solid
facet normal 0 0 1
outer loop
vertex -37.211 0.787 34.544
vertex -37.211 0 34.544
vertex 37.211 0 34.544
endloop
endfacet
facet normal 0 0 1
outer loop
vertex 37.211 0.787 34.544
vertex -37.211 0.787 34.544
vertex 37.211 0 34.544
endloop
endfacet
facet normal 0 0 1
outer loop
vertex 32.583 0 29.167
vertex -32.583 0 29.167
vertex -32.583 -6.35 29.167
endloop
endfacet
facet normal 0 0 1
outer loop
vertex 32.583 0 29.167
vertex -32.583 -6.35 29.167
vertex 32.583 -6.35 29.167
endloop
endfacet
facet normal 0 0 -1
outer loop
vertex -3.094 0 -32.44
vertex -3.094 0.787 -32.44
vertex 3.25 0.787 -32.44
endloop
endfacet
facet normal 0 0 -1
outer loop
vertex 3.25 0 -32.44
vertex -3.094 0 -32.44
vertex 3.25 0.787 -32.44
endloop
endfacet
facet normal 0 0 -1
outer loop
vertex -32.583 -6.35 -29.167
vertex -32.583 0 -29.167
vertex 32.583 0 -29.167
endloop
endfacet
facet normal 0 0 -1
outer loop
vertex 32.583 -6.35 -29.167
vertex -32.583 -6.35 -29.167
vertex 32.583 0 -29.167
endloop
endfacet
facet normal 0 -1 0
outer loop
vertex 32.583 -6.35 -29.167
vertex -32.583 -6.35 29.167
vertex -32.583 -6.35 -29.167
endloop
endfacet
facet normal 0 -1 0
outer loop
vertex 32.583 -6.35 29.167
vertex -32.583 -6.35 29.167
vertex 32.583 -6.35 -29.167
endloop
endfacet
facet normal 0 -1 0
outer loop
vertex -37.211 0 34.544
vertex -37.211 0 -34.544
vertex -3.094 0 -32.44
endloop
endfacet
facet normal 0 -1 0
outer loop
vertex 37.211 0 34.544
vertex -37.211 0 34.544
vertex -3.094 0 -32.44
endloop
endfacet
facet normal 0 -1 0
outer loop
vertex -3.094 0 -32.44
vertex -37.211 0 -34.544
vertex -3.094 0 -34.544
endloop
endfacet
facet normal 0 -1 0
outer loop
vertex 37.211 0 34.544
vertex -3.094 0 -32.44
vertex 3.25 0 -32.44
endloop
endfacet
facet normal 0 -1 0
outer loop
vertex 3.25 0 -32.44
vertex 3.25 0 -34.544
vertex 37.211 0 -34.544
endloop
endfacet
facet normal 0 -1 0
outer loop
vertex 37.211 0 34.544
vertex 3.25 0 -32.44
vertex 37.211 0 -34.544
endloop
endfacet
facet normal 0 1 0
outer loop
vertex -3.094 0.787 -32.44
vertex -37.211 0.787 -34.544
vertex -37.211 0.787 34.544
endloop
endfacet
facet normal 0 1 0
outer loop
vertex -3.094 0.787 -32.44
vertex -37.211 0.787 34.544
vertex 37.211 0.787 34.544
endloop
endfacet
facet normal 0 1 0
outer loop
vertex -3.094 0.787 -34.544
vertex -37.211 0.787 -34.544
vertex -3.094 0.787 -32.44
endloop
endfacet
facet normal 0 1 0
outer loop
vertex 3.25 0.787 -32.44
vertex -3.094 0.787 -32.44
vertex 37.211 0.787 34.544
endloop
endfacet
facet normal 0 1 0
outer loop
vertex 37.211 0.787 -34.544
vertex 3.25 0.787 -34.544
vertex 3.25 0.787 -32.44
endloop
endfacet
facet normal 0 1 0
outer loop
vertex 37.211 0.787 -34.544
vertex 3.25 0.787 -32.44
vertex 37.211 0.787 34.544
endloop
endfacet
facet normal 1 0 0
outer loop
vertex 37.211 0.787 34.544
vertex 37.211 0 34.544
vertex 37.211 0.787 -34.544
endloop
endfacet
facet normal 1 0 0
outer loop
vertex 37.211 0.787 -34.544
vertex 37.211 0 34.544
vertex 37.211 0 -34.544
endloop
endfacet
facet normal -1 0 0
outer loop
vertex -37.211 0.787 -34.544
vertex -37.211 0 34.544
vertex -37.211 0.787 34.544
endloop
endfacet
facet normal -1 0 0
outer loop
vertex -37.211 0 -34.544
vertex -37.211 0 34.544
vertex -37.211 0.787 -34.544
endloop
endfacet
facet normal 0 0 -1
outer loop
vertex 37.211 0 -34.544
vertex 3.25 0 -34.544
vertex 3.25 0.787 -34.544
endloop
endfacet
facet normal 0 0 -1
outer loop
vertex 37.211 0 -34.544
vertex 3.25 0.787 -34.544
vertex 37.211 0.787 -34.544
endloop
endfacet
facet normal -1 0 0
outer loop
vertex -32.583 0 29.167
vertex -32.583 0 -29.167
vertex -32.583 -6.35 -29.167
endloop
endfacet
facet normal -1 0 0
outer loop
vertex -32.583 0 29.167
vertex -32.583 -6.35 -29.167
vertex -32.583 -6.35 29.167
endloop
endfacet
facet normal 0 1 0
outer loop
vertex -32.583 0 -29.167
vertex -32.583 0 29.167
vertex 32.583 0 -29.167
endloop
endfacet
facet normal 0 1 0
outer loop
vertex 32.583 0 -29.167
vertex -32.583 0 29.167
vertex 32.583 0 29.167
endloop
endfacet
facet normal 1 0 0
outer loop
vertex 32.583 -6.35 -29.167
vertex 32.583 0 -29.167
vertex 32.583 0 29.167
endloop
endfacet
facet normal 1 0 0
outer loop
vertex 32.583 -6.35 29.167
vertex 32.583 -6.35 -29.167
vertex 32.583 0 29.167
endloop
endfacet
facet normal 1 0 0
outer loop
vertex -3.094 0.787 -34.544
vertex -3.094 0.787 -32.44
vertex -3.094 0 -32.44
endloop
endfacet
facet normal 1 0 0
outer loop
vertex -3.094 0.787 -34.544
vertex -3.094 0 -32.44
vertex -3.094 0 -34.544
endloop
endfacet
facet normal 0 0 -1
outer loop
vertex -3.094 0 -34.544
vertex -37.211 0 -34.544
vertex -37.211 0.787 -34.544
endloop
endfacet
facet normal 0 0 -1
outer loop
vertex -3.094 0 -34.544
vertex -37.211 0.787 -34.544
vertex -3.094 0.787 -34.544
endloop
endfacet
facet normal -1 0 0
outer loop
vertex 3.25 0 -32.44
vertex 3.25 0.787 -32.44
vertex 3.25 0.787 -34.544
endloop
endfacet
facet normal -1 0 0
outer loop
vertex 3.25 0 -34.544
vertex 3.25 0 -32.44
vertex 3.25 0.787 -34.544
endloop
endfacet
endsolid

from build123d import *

# Parameters (mm, degrees)
SKETCH1_W           = 74.422
SKETCH1_H           = 69.088
BOSS_EXTRUDE1_DEPTH = 0.7874
SKETCH2_W           = 65.16654669
SKETCH2_H           = 58.334735
BOSS_EXTRUDE2_DEPTH = 6.35
SKETCH3_W           = 6.344505944
SKETCH3_H           = 2.10385028
CUT_EXTRUDE1_DEPTH  = 6.35


with BuildPart() as part:
    # Sketch1 → Boss-Extrude1 (new body)
    with BuildSketch(Plane(origin=(0, 0, 0), x_dir=(1, 0, 0), z_dir=(0, 1, 0))):
        Rectangle(SKETCH1_W, SKETCH1_H)
    extrude(amount=BOSS_EXTRUDE1_DEPTH)

    # Sketch3 → Cut-Extrude1 (cut)
    with BuildSketch(Plane(origin=(0, 0.7874, 0), x_dir=(1, 0, 0), z_dir=(0, 1, 0))):
        with Locations((0.078037772, 33.49207486)):
            Rectangle(SKETCH3_W, SKETCH3_H)
    extrude(amount=-CUT_EXTRUDE1_DEPTH, mode=Mode.SUBTRACT)


with BuildPart() as body_2:
    # Sketch2 → Boss-Extrude2 (new body)
    with BuildSketch(Plane.XZ):
        Rectangle(SKETCH2_W, SKETCH2_H)
    extrude(amount=BOSS_EXTRUDE2_DEPTH)


solid = Compound([part.part, body_2.part])
